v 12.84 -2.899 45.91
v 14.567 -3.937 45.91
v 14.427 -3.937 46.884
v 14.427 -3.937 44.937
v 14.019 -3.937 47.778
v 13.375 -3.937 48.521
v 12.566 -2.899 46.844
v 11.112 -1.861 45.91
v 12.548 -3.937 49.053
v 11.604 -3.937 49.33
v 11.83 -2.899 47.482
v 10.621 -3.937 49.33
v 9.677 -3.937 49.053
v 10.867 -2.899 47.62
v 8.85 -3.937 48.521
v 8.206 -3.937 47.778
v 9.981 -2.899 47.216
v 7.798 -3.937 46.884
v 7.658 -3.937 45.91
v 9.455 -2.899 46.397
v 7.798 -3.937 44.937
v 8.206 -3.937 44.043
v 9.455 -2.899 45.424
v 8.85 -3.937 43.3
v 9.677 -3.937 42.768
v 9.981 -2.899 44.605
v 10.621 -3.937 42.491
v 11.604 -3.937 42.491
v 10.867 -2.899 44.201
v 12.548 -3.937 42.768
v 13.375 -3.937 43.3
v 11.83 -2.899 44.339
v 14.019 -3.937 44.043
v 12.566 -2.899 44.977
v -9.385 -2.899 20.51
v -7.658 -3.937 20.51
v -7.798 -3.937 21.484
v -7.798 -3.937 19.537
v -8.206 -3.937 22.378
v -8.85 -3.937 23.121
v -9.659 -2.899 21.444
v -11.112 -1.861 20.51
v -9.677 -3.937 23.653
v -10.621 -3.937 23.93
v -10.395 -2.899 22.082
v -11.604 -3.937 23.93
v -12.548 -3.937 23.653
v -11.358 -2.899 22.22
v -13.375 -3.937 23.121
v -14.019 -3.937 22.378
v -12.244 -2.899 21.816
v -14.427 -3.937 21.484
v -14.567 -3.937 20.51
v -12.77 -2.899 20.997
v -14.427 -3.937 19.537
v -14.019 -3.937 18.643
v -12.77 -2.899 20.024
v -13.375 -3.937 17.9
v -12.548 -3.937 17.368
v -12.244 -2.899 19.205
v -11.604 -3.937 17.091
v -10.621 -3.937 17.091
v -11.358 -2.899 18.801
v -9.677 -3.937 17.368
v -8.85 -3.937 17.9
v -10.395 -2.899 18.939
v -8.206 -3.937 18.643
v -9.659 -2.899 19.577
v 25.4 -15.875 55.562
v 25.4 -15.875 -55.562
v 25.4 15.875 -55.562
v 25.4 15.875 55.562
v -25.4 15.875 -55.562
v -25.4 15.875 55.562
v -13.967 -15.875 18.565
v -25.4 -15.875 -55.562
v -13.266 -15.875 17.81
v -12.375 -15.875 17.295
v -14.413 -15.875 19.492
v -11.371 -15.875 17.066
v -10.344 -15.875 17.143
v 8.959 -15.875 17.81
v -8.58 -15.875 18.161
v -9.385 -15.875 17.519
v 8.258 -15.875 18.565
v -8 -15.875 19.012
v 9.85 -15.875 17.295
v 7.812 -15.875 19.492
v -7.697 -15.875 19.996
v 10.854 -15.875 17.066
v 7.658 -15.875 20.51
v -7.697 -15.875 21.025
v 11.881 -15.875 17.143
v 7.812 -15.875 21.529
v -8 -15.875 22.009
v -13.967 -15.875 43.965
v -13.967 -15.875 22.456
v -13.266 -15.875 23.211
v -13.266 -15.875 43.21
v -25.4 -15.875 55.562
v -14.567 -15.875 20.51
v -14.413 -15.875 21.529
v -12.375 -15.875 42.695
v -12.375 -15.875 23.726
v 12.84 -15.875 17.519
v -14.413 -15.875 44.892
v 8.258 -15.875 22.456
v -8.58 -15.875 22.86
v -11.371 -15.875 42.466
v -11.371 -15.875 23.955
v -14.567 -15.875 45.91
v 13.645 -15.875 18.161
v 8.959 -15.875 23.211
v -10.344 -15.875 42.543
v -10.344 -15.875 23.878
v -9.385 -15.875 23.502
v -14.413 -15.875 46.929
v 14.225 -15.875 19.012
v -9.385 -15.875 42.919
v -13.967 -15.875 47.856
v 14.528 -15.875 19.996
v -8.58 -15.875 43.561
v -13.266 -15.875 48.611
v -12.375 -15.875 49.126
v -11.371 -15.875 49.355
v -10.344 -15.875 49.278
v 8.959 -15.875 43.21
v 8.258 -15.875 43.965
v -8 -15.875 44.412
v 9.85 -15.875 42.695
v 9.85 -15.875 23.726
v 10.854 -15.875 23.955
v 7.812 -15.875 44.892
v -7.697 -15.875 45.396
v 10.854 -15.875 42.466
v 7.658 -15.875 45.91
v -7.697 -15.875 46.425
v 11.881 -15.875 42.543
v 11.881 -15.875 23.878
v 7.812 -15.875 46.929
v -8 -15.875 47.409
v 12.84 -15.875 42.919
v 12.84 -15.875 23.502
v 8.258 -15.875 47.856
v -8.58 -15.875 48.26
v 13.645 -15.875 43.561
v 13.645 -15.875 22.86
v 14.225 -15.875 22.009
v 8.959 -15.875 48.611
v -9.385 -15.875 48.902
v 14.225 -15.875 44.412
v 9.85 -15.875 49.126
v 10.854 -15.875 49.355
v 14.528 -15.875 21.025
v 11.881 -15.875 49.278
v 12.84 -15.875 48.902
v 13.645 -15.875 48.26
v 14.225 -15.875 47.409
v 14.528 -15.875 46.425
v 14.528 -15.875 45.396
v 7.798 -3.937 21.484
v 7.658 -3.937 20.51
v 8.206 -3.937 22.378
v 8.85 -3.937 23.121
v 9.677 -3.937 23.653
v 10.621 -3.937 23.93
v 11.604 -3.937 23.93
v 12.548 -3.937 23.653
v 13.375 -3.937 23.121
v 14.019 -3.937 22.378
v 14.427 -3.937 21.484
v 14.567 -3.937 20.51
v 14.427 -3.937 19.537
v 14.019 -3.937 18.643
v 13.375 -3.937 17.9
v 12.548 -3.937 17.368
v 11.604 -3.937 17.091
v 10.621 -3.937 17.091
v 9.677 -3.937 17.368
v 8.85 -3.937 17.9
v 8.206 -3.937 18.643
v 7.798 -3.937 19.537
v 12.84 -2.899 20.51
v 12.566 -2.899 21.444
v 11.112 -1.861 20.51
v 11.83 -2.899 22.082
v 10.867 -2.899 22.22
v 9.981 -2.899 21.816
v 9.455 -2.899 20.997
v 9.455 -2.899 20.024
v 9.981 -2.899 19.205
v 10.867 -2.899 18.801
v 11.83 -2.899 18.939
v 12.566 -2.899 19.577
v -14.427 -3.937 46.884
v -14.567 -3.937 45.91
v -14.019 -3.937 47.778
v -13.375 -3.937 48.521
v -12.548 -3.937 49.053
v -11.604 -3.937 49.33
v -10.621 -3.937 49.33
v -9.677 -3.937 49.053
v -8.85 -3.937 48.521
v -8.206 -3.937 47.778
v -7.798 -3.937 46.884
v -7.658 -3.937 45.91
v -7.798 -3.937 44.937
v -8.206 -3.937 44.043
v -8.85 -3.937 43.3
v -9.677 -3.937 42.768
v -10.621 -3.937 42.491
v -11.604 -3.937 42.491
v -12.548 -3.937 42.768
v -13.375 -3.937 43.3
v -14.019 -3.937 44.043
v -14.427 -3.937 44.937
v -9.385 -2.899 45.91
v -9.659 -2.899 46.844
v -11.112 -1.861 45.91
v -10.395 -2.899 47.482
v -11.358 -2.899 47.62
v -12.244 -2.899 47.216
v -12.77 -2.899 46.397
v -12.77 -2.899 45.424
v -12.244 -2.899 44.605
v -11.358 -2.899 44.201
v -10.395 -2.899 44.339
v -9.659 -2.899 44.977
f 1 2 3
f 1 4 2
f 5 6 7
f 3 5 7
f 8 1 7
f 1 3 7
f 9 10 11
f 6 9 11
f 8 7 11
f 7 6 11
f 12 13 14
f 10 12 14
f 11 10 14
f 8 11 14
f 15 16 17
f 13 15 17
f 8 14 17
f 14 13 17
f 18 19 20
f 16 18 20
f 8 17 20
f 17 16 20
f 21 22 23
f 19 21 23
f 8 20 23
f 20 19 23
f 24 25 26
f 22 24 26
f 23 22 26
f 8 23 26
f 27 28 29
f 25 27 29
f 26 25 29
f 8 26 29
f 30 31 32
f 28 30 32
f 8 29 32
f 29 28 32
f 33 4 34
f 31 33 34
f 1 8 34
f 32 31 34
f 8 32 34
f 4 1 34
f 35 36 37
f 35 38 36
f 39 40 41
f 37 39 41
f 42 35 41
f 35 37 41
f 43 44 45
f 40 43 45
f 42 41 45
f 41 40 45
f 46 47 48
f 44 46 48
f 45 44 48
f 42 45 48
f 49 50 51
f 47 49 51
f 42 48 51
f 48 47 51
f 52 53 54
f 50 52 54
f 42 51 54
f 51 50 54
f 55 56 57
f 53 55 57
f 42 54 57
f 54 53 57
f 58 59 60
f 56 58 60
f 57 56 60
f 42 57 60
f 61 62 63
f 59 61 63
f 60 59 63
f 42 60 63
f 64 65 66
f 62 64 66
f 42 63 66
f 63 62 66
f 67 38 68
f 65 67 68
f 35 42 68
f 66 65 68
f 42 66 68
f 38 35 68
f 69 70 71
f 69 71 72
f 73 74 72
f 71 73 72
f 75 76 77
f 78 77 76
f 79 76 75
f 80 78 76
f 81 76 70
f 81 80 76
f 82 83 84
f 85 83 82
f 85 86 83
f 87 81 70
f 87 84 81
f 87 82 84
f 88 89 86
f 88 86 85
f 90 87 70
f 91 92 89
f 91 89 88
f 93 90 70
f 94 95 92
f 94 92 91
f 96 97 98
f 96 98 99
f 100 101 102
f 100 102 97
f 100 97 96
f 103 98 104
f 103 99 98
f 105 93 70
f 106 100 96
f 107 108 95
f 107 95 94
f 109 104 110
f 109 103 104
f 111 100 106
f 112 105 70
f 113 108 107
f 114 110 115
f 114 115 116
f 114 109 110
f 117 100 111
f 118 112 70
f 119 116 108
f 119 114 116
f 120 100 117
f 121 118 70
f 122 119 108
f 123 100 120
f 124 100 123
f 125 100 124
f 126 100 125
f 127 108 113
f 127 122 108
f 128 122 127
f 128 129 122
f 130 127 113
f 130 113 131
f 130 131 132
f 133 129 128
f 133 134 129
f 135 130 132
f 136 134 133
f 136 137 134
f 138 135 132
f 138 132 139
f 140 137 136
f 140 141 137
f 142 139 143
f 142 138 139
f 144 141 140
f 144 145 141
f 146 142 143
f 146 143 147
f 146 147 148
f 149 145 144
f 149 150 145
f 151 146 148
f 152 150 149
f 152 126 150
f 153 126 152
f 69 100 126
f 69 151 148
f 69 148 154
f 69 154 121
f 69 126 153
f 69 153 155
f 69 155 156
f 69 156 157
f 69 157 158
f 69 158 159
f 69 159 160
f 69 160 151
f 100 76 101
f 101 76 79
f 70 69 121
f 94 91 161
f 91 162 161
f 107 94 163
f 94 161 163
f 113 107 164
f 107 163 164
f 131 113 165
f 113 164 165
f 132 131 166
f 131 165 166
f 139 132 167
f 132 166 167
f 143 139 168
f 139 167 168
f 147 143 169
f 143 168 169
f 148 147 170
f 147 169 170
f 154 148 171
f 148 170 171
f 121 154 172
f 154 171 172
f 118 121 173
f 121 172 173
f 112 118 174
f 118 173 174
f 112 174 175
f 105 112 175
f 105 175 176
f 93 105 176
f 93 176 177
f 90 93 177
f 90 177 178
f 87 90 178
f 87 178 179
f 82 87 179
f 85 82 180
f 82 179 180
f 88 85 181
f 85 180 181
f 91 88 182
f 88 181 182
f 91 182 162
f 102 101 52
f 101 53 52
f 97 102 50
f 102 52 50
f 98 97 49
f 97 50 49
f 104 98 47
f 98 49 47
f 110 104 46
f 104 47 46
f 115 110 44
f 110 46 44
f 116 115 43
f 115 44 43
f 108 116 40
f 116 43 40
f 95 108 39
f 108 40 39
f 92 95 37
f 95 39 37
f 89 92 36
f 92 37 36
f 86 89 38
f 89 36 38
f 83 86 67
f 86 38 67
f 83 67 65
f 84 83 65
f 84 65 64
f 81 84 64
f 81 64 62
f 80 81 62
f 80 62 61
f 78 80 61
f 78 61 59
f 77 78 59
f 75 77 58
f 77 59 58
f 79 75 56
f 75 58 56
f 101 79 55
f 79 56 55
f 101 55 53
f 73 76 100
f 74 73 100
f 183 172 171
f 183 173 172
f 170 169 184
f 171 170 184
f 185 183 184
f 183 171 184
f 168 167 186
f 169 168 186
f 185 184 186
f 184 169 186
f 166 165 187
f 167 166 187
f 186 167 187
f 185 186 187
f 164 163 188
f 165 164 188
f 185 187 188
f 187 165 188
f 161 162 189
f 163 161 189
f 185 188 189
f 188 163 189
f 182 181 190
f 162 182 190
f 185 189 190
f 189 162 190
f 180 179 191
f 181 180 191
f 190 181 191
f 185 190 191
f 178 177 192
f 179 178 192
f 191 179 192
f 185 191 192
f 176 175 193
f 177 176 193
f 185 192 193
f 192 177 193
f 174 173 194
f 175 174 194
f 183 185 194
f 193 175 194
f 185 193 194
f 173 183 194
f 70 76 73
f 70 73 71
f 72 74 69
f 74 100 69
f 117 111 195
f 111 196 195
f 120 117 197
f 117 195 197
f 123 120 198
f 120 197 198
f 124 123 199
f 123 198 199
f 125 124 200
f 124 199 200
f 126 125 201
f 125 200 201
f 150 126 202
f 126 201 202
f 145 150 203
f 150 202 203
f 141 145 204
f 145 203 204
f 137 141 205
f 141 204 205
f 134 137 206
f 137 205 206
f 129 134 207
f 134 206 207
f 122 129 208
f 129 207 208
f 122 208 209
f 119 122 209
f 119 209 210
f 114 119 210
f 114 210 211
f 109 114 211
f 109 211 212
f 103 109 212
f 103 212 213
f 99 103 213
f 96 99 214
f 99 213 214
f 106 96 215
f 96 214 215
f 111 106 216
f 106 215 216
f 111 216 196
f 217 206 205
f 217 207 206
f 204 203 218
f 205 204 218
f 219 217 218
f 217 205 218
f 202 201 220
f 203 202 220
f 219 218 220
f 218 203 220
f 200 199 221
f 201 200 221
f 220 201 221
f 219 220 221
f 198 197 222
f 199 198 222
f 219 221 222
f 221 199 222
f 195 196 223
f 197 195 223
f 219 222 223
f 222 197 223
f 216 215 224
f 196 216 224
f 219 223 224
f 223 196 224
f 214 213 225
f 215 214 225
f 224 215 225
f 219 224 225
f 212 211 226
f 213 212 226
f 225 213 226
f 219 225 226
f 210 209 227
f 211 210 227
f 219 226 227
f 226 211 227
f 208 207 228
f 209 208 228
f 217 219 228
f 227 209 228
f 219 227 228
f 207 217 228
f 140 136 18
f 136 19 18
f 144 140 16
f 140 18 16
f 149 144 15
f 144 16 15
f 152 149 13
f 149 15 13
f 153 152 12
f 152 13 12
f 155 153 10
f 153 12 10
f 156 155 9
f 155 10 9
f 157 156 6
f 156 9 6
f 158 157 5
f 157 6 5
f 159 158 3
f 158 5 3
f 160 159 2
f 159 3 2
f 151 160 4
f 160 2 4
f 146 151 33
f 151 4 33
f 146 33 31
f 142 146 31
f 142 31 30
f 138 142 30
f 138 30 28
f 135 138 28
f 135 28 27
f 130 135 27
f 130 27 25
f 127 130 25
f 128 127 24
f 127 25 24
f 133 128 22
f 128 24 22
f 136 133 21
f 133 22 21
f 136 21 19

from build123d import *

# Parameters (mm, degrees)
F0_W     = 50.8
F0_H     = 111.125
F1_DEPTH = 15.875
F3_D     = 6.9088
F3_DEPTH = 11.938
F3_TIP   = 2.0756129224


with BuildPart() as f1:
    # F0 (on Front) → F1 (new body, symmetric)
    with BuildSketch(Plane.XZ):
        Rectangle(F0_W, F0_H)
    extrude(amount=F1_DEPTH, both=True)

    # F3
    with Locations(Plane.XZ.offset(15.875)):
        with Locations((-11.1125, 45.9105), (11.1125, 45.9105), (-11.1125, 20.5105), (11.1125, 20.5105)):
            Hole(F3_D / 2, depth=F3_DEPTH)
            with Locations((0, 0, -(F3_DEPTH + F3_TIP / 2))):  # 118° drill point
                Cone(0, F3_D / 2, F3_TIP, mode=Mode.SUBTRACT)


solid = f1.part
